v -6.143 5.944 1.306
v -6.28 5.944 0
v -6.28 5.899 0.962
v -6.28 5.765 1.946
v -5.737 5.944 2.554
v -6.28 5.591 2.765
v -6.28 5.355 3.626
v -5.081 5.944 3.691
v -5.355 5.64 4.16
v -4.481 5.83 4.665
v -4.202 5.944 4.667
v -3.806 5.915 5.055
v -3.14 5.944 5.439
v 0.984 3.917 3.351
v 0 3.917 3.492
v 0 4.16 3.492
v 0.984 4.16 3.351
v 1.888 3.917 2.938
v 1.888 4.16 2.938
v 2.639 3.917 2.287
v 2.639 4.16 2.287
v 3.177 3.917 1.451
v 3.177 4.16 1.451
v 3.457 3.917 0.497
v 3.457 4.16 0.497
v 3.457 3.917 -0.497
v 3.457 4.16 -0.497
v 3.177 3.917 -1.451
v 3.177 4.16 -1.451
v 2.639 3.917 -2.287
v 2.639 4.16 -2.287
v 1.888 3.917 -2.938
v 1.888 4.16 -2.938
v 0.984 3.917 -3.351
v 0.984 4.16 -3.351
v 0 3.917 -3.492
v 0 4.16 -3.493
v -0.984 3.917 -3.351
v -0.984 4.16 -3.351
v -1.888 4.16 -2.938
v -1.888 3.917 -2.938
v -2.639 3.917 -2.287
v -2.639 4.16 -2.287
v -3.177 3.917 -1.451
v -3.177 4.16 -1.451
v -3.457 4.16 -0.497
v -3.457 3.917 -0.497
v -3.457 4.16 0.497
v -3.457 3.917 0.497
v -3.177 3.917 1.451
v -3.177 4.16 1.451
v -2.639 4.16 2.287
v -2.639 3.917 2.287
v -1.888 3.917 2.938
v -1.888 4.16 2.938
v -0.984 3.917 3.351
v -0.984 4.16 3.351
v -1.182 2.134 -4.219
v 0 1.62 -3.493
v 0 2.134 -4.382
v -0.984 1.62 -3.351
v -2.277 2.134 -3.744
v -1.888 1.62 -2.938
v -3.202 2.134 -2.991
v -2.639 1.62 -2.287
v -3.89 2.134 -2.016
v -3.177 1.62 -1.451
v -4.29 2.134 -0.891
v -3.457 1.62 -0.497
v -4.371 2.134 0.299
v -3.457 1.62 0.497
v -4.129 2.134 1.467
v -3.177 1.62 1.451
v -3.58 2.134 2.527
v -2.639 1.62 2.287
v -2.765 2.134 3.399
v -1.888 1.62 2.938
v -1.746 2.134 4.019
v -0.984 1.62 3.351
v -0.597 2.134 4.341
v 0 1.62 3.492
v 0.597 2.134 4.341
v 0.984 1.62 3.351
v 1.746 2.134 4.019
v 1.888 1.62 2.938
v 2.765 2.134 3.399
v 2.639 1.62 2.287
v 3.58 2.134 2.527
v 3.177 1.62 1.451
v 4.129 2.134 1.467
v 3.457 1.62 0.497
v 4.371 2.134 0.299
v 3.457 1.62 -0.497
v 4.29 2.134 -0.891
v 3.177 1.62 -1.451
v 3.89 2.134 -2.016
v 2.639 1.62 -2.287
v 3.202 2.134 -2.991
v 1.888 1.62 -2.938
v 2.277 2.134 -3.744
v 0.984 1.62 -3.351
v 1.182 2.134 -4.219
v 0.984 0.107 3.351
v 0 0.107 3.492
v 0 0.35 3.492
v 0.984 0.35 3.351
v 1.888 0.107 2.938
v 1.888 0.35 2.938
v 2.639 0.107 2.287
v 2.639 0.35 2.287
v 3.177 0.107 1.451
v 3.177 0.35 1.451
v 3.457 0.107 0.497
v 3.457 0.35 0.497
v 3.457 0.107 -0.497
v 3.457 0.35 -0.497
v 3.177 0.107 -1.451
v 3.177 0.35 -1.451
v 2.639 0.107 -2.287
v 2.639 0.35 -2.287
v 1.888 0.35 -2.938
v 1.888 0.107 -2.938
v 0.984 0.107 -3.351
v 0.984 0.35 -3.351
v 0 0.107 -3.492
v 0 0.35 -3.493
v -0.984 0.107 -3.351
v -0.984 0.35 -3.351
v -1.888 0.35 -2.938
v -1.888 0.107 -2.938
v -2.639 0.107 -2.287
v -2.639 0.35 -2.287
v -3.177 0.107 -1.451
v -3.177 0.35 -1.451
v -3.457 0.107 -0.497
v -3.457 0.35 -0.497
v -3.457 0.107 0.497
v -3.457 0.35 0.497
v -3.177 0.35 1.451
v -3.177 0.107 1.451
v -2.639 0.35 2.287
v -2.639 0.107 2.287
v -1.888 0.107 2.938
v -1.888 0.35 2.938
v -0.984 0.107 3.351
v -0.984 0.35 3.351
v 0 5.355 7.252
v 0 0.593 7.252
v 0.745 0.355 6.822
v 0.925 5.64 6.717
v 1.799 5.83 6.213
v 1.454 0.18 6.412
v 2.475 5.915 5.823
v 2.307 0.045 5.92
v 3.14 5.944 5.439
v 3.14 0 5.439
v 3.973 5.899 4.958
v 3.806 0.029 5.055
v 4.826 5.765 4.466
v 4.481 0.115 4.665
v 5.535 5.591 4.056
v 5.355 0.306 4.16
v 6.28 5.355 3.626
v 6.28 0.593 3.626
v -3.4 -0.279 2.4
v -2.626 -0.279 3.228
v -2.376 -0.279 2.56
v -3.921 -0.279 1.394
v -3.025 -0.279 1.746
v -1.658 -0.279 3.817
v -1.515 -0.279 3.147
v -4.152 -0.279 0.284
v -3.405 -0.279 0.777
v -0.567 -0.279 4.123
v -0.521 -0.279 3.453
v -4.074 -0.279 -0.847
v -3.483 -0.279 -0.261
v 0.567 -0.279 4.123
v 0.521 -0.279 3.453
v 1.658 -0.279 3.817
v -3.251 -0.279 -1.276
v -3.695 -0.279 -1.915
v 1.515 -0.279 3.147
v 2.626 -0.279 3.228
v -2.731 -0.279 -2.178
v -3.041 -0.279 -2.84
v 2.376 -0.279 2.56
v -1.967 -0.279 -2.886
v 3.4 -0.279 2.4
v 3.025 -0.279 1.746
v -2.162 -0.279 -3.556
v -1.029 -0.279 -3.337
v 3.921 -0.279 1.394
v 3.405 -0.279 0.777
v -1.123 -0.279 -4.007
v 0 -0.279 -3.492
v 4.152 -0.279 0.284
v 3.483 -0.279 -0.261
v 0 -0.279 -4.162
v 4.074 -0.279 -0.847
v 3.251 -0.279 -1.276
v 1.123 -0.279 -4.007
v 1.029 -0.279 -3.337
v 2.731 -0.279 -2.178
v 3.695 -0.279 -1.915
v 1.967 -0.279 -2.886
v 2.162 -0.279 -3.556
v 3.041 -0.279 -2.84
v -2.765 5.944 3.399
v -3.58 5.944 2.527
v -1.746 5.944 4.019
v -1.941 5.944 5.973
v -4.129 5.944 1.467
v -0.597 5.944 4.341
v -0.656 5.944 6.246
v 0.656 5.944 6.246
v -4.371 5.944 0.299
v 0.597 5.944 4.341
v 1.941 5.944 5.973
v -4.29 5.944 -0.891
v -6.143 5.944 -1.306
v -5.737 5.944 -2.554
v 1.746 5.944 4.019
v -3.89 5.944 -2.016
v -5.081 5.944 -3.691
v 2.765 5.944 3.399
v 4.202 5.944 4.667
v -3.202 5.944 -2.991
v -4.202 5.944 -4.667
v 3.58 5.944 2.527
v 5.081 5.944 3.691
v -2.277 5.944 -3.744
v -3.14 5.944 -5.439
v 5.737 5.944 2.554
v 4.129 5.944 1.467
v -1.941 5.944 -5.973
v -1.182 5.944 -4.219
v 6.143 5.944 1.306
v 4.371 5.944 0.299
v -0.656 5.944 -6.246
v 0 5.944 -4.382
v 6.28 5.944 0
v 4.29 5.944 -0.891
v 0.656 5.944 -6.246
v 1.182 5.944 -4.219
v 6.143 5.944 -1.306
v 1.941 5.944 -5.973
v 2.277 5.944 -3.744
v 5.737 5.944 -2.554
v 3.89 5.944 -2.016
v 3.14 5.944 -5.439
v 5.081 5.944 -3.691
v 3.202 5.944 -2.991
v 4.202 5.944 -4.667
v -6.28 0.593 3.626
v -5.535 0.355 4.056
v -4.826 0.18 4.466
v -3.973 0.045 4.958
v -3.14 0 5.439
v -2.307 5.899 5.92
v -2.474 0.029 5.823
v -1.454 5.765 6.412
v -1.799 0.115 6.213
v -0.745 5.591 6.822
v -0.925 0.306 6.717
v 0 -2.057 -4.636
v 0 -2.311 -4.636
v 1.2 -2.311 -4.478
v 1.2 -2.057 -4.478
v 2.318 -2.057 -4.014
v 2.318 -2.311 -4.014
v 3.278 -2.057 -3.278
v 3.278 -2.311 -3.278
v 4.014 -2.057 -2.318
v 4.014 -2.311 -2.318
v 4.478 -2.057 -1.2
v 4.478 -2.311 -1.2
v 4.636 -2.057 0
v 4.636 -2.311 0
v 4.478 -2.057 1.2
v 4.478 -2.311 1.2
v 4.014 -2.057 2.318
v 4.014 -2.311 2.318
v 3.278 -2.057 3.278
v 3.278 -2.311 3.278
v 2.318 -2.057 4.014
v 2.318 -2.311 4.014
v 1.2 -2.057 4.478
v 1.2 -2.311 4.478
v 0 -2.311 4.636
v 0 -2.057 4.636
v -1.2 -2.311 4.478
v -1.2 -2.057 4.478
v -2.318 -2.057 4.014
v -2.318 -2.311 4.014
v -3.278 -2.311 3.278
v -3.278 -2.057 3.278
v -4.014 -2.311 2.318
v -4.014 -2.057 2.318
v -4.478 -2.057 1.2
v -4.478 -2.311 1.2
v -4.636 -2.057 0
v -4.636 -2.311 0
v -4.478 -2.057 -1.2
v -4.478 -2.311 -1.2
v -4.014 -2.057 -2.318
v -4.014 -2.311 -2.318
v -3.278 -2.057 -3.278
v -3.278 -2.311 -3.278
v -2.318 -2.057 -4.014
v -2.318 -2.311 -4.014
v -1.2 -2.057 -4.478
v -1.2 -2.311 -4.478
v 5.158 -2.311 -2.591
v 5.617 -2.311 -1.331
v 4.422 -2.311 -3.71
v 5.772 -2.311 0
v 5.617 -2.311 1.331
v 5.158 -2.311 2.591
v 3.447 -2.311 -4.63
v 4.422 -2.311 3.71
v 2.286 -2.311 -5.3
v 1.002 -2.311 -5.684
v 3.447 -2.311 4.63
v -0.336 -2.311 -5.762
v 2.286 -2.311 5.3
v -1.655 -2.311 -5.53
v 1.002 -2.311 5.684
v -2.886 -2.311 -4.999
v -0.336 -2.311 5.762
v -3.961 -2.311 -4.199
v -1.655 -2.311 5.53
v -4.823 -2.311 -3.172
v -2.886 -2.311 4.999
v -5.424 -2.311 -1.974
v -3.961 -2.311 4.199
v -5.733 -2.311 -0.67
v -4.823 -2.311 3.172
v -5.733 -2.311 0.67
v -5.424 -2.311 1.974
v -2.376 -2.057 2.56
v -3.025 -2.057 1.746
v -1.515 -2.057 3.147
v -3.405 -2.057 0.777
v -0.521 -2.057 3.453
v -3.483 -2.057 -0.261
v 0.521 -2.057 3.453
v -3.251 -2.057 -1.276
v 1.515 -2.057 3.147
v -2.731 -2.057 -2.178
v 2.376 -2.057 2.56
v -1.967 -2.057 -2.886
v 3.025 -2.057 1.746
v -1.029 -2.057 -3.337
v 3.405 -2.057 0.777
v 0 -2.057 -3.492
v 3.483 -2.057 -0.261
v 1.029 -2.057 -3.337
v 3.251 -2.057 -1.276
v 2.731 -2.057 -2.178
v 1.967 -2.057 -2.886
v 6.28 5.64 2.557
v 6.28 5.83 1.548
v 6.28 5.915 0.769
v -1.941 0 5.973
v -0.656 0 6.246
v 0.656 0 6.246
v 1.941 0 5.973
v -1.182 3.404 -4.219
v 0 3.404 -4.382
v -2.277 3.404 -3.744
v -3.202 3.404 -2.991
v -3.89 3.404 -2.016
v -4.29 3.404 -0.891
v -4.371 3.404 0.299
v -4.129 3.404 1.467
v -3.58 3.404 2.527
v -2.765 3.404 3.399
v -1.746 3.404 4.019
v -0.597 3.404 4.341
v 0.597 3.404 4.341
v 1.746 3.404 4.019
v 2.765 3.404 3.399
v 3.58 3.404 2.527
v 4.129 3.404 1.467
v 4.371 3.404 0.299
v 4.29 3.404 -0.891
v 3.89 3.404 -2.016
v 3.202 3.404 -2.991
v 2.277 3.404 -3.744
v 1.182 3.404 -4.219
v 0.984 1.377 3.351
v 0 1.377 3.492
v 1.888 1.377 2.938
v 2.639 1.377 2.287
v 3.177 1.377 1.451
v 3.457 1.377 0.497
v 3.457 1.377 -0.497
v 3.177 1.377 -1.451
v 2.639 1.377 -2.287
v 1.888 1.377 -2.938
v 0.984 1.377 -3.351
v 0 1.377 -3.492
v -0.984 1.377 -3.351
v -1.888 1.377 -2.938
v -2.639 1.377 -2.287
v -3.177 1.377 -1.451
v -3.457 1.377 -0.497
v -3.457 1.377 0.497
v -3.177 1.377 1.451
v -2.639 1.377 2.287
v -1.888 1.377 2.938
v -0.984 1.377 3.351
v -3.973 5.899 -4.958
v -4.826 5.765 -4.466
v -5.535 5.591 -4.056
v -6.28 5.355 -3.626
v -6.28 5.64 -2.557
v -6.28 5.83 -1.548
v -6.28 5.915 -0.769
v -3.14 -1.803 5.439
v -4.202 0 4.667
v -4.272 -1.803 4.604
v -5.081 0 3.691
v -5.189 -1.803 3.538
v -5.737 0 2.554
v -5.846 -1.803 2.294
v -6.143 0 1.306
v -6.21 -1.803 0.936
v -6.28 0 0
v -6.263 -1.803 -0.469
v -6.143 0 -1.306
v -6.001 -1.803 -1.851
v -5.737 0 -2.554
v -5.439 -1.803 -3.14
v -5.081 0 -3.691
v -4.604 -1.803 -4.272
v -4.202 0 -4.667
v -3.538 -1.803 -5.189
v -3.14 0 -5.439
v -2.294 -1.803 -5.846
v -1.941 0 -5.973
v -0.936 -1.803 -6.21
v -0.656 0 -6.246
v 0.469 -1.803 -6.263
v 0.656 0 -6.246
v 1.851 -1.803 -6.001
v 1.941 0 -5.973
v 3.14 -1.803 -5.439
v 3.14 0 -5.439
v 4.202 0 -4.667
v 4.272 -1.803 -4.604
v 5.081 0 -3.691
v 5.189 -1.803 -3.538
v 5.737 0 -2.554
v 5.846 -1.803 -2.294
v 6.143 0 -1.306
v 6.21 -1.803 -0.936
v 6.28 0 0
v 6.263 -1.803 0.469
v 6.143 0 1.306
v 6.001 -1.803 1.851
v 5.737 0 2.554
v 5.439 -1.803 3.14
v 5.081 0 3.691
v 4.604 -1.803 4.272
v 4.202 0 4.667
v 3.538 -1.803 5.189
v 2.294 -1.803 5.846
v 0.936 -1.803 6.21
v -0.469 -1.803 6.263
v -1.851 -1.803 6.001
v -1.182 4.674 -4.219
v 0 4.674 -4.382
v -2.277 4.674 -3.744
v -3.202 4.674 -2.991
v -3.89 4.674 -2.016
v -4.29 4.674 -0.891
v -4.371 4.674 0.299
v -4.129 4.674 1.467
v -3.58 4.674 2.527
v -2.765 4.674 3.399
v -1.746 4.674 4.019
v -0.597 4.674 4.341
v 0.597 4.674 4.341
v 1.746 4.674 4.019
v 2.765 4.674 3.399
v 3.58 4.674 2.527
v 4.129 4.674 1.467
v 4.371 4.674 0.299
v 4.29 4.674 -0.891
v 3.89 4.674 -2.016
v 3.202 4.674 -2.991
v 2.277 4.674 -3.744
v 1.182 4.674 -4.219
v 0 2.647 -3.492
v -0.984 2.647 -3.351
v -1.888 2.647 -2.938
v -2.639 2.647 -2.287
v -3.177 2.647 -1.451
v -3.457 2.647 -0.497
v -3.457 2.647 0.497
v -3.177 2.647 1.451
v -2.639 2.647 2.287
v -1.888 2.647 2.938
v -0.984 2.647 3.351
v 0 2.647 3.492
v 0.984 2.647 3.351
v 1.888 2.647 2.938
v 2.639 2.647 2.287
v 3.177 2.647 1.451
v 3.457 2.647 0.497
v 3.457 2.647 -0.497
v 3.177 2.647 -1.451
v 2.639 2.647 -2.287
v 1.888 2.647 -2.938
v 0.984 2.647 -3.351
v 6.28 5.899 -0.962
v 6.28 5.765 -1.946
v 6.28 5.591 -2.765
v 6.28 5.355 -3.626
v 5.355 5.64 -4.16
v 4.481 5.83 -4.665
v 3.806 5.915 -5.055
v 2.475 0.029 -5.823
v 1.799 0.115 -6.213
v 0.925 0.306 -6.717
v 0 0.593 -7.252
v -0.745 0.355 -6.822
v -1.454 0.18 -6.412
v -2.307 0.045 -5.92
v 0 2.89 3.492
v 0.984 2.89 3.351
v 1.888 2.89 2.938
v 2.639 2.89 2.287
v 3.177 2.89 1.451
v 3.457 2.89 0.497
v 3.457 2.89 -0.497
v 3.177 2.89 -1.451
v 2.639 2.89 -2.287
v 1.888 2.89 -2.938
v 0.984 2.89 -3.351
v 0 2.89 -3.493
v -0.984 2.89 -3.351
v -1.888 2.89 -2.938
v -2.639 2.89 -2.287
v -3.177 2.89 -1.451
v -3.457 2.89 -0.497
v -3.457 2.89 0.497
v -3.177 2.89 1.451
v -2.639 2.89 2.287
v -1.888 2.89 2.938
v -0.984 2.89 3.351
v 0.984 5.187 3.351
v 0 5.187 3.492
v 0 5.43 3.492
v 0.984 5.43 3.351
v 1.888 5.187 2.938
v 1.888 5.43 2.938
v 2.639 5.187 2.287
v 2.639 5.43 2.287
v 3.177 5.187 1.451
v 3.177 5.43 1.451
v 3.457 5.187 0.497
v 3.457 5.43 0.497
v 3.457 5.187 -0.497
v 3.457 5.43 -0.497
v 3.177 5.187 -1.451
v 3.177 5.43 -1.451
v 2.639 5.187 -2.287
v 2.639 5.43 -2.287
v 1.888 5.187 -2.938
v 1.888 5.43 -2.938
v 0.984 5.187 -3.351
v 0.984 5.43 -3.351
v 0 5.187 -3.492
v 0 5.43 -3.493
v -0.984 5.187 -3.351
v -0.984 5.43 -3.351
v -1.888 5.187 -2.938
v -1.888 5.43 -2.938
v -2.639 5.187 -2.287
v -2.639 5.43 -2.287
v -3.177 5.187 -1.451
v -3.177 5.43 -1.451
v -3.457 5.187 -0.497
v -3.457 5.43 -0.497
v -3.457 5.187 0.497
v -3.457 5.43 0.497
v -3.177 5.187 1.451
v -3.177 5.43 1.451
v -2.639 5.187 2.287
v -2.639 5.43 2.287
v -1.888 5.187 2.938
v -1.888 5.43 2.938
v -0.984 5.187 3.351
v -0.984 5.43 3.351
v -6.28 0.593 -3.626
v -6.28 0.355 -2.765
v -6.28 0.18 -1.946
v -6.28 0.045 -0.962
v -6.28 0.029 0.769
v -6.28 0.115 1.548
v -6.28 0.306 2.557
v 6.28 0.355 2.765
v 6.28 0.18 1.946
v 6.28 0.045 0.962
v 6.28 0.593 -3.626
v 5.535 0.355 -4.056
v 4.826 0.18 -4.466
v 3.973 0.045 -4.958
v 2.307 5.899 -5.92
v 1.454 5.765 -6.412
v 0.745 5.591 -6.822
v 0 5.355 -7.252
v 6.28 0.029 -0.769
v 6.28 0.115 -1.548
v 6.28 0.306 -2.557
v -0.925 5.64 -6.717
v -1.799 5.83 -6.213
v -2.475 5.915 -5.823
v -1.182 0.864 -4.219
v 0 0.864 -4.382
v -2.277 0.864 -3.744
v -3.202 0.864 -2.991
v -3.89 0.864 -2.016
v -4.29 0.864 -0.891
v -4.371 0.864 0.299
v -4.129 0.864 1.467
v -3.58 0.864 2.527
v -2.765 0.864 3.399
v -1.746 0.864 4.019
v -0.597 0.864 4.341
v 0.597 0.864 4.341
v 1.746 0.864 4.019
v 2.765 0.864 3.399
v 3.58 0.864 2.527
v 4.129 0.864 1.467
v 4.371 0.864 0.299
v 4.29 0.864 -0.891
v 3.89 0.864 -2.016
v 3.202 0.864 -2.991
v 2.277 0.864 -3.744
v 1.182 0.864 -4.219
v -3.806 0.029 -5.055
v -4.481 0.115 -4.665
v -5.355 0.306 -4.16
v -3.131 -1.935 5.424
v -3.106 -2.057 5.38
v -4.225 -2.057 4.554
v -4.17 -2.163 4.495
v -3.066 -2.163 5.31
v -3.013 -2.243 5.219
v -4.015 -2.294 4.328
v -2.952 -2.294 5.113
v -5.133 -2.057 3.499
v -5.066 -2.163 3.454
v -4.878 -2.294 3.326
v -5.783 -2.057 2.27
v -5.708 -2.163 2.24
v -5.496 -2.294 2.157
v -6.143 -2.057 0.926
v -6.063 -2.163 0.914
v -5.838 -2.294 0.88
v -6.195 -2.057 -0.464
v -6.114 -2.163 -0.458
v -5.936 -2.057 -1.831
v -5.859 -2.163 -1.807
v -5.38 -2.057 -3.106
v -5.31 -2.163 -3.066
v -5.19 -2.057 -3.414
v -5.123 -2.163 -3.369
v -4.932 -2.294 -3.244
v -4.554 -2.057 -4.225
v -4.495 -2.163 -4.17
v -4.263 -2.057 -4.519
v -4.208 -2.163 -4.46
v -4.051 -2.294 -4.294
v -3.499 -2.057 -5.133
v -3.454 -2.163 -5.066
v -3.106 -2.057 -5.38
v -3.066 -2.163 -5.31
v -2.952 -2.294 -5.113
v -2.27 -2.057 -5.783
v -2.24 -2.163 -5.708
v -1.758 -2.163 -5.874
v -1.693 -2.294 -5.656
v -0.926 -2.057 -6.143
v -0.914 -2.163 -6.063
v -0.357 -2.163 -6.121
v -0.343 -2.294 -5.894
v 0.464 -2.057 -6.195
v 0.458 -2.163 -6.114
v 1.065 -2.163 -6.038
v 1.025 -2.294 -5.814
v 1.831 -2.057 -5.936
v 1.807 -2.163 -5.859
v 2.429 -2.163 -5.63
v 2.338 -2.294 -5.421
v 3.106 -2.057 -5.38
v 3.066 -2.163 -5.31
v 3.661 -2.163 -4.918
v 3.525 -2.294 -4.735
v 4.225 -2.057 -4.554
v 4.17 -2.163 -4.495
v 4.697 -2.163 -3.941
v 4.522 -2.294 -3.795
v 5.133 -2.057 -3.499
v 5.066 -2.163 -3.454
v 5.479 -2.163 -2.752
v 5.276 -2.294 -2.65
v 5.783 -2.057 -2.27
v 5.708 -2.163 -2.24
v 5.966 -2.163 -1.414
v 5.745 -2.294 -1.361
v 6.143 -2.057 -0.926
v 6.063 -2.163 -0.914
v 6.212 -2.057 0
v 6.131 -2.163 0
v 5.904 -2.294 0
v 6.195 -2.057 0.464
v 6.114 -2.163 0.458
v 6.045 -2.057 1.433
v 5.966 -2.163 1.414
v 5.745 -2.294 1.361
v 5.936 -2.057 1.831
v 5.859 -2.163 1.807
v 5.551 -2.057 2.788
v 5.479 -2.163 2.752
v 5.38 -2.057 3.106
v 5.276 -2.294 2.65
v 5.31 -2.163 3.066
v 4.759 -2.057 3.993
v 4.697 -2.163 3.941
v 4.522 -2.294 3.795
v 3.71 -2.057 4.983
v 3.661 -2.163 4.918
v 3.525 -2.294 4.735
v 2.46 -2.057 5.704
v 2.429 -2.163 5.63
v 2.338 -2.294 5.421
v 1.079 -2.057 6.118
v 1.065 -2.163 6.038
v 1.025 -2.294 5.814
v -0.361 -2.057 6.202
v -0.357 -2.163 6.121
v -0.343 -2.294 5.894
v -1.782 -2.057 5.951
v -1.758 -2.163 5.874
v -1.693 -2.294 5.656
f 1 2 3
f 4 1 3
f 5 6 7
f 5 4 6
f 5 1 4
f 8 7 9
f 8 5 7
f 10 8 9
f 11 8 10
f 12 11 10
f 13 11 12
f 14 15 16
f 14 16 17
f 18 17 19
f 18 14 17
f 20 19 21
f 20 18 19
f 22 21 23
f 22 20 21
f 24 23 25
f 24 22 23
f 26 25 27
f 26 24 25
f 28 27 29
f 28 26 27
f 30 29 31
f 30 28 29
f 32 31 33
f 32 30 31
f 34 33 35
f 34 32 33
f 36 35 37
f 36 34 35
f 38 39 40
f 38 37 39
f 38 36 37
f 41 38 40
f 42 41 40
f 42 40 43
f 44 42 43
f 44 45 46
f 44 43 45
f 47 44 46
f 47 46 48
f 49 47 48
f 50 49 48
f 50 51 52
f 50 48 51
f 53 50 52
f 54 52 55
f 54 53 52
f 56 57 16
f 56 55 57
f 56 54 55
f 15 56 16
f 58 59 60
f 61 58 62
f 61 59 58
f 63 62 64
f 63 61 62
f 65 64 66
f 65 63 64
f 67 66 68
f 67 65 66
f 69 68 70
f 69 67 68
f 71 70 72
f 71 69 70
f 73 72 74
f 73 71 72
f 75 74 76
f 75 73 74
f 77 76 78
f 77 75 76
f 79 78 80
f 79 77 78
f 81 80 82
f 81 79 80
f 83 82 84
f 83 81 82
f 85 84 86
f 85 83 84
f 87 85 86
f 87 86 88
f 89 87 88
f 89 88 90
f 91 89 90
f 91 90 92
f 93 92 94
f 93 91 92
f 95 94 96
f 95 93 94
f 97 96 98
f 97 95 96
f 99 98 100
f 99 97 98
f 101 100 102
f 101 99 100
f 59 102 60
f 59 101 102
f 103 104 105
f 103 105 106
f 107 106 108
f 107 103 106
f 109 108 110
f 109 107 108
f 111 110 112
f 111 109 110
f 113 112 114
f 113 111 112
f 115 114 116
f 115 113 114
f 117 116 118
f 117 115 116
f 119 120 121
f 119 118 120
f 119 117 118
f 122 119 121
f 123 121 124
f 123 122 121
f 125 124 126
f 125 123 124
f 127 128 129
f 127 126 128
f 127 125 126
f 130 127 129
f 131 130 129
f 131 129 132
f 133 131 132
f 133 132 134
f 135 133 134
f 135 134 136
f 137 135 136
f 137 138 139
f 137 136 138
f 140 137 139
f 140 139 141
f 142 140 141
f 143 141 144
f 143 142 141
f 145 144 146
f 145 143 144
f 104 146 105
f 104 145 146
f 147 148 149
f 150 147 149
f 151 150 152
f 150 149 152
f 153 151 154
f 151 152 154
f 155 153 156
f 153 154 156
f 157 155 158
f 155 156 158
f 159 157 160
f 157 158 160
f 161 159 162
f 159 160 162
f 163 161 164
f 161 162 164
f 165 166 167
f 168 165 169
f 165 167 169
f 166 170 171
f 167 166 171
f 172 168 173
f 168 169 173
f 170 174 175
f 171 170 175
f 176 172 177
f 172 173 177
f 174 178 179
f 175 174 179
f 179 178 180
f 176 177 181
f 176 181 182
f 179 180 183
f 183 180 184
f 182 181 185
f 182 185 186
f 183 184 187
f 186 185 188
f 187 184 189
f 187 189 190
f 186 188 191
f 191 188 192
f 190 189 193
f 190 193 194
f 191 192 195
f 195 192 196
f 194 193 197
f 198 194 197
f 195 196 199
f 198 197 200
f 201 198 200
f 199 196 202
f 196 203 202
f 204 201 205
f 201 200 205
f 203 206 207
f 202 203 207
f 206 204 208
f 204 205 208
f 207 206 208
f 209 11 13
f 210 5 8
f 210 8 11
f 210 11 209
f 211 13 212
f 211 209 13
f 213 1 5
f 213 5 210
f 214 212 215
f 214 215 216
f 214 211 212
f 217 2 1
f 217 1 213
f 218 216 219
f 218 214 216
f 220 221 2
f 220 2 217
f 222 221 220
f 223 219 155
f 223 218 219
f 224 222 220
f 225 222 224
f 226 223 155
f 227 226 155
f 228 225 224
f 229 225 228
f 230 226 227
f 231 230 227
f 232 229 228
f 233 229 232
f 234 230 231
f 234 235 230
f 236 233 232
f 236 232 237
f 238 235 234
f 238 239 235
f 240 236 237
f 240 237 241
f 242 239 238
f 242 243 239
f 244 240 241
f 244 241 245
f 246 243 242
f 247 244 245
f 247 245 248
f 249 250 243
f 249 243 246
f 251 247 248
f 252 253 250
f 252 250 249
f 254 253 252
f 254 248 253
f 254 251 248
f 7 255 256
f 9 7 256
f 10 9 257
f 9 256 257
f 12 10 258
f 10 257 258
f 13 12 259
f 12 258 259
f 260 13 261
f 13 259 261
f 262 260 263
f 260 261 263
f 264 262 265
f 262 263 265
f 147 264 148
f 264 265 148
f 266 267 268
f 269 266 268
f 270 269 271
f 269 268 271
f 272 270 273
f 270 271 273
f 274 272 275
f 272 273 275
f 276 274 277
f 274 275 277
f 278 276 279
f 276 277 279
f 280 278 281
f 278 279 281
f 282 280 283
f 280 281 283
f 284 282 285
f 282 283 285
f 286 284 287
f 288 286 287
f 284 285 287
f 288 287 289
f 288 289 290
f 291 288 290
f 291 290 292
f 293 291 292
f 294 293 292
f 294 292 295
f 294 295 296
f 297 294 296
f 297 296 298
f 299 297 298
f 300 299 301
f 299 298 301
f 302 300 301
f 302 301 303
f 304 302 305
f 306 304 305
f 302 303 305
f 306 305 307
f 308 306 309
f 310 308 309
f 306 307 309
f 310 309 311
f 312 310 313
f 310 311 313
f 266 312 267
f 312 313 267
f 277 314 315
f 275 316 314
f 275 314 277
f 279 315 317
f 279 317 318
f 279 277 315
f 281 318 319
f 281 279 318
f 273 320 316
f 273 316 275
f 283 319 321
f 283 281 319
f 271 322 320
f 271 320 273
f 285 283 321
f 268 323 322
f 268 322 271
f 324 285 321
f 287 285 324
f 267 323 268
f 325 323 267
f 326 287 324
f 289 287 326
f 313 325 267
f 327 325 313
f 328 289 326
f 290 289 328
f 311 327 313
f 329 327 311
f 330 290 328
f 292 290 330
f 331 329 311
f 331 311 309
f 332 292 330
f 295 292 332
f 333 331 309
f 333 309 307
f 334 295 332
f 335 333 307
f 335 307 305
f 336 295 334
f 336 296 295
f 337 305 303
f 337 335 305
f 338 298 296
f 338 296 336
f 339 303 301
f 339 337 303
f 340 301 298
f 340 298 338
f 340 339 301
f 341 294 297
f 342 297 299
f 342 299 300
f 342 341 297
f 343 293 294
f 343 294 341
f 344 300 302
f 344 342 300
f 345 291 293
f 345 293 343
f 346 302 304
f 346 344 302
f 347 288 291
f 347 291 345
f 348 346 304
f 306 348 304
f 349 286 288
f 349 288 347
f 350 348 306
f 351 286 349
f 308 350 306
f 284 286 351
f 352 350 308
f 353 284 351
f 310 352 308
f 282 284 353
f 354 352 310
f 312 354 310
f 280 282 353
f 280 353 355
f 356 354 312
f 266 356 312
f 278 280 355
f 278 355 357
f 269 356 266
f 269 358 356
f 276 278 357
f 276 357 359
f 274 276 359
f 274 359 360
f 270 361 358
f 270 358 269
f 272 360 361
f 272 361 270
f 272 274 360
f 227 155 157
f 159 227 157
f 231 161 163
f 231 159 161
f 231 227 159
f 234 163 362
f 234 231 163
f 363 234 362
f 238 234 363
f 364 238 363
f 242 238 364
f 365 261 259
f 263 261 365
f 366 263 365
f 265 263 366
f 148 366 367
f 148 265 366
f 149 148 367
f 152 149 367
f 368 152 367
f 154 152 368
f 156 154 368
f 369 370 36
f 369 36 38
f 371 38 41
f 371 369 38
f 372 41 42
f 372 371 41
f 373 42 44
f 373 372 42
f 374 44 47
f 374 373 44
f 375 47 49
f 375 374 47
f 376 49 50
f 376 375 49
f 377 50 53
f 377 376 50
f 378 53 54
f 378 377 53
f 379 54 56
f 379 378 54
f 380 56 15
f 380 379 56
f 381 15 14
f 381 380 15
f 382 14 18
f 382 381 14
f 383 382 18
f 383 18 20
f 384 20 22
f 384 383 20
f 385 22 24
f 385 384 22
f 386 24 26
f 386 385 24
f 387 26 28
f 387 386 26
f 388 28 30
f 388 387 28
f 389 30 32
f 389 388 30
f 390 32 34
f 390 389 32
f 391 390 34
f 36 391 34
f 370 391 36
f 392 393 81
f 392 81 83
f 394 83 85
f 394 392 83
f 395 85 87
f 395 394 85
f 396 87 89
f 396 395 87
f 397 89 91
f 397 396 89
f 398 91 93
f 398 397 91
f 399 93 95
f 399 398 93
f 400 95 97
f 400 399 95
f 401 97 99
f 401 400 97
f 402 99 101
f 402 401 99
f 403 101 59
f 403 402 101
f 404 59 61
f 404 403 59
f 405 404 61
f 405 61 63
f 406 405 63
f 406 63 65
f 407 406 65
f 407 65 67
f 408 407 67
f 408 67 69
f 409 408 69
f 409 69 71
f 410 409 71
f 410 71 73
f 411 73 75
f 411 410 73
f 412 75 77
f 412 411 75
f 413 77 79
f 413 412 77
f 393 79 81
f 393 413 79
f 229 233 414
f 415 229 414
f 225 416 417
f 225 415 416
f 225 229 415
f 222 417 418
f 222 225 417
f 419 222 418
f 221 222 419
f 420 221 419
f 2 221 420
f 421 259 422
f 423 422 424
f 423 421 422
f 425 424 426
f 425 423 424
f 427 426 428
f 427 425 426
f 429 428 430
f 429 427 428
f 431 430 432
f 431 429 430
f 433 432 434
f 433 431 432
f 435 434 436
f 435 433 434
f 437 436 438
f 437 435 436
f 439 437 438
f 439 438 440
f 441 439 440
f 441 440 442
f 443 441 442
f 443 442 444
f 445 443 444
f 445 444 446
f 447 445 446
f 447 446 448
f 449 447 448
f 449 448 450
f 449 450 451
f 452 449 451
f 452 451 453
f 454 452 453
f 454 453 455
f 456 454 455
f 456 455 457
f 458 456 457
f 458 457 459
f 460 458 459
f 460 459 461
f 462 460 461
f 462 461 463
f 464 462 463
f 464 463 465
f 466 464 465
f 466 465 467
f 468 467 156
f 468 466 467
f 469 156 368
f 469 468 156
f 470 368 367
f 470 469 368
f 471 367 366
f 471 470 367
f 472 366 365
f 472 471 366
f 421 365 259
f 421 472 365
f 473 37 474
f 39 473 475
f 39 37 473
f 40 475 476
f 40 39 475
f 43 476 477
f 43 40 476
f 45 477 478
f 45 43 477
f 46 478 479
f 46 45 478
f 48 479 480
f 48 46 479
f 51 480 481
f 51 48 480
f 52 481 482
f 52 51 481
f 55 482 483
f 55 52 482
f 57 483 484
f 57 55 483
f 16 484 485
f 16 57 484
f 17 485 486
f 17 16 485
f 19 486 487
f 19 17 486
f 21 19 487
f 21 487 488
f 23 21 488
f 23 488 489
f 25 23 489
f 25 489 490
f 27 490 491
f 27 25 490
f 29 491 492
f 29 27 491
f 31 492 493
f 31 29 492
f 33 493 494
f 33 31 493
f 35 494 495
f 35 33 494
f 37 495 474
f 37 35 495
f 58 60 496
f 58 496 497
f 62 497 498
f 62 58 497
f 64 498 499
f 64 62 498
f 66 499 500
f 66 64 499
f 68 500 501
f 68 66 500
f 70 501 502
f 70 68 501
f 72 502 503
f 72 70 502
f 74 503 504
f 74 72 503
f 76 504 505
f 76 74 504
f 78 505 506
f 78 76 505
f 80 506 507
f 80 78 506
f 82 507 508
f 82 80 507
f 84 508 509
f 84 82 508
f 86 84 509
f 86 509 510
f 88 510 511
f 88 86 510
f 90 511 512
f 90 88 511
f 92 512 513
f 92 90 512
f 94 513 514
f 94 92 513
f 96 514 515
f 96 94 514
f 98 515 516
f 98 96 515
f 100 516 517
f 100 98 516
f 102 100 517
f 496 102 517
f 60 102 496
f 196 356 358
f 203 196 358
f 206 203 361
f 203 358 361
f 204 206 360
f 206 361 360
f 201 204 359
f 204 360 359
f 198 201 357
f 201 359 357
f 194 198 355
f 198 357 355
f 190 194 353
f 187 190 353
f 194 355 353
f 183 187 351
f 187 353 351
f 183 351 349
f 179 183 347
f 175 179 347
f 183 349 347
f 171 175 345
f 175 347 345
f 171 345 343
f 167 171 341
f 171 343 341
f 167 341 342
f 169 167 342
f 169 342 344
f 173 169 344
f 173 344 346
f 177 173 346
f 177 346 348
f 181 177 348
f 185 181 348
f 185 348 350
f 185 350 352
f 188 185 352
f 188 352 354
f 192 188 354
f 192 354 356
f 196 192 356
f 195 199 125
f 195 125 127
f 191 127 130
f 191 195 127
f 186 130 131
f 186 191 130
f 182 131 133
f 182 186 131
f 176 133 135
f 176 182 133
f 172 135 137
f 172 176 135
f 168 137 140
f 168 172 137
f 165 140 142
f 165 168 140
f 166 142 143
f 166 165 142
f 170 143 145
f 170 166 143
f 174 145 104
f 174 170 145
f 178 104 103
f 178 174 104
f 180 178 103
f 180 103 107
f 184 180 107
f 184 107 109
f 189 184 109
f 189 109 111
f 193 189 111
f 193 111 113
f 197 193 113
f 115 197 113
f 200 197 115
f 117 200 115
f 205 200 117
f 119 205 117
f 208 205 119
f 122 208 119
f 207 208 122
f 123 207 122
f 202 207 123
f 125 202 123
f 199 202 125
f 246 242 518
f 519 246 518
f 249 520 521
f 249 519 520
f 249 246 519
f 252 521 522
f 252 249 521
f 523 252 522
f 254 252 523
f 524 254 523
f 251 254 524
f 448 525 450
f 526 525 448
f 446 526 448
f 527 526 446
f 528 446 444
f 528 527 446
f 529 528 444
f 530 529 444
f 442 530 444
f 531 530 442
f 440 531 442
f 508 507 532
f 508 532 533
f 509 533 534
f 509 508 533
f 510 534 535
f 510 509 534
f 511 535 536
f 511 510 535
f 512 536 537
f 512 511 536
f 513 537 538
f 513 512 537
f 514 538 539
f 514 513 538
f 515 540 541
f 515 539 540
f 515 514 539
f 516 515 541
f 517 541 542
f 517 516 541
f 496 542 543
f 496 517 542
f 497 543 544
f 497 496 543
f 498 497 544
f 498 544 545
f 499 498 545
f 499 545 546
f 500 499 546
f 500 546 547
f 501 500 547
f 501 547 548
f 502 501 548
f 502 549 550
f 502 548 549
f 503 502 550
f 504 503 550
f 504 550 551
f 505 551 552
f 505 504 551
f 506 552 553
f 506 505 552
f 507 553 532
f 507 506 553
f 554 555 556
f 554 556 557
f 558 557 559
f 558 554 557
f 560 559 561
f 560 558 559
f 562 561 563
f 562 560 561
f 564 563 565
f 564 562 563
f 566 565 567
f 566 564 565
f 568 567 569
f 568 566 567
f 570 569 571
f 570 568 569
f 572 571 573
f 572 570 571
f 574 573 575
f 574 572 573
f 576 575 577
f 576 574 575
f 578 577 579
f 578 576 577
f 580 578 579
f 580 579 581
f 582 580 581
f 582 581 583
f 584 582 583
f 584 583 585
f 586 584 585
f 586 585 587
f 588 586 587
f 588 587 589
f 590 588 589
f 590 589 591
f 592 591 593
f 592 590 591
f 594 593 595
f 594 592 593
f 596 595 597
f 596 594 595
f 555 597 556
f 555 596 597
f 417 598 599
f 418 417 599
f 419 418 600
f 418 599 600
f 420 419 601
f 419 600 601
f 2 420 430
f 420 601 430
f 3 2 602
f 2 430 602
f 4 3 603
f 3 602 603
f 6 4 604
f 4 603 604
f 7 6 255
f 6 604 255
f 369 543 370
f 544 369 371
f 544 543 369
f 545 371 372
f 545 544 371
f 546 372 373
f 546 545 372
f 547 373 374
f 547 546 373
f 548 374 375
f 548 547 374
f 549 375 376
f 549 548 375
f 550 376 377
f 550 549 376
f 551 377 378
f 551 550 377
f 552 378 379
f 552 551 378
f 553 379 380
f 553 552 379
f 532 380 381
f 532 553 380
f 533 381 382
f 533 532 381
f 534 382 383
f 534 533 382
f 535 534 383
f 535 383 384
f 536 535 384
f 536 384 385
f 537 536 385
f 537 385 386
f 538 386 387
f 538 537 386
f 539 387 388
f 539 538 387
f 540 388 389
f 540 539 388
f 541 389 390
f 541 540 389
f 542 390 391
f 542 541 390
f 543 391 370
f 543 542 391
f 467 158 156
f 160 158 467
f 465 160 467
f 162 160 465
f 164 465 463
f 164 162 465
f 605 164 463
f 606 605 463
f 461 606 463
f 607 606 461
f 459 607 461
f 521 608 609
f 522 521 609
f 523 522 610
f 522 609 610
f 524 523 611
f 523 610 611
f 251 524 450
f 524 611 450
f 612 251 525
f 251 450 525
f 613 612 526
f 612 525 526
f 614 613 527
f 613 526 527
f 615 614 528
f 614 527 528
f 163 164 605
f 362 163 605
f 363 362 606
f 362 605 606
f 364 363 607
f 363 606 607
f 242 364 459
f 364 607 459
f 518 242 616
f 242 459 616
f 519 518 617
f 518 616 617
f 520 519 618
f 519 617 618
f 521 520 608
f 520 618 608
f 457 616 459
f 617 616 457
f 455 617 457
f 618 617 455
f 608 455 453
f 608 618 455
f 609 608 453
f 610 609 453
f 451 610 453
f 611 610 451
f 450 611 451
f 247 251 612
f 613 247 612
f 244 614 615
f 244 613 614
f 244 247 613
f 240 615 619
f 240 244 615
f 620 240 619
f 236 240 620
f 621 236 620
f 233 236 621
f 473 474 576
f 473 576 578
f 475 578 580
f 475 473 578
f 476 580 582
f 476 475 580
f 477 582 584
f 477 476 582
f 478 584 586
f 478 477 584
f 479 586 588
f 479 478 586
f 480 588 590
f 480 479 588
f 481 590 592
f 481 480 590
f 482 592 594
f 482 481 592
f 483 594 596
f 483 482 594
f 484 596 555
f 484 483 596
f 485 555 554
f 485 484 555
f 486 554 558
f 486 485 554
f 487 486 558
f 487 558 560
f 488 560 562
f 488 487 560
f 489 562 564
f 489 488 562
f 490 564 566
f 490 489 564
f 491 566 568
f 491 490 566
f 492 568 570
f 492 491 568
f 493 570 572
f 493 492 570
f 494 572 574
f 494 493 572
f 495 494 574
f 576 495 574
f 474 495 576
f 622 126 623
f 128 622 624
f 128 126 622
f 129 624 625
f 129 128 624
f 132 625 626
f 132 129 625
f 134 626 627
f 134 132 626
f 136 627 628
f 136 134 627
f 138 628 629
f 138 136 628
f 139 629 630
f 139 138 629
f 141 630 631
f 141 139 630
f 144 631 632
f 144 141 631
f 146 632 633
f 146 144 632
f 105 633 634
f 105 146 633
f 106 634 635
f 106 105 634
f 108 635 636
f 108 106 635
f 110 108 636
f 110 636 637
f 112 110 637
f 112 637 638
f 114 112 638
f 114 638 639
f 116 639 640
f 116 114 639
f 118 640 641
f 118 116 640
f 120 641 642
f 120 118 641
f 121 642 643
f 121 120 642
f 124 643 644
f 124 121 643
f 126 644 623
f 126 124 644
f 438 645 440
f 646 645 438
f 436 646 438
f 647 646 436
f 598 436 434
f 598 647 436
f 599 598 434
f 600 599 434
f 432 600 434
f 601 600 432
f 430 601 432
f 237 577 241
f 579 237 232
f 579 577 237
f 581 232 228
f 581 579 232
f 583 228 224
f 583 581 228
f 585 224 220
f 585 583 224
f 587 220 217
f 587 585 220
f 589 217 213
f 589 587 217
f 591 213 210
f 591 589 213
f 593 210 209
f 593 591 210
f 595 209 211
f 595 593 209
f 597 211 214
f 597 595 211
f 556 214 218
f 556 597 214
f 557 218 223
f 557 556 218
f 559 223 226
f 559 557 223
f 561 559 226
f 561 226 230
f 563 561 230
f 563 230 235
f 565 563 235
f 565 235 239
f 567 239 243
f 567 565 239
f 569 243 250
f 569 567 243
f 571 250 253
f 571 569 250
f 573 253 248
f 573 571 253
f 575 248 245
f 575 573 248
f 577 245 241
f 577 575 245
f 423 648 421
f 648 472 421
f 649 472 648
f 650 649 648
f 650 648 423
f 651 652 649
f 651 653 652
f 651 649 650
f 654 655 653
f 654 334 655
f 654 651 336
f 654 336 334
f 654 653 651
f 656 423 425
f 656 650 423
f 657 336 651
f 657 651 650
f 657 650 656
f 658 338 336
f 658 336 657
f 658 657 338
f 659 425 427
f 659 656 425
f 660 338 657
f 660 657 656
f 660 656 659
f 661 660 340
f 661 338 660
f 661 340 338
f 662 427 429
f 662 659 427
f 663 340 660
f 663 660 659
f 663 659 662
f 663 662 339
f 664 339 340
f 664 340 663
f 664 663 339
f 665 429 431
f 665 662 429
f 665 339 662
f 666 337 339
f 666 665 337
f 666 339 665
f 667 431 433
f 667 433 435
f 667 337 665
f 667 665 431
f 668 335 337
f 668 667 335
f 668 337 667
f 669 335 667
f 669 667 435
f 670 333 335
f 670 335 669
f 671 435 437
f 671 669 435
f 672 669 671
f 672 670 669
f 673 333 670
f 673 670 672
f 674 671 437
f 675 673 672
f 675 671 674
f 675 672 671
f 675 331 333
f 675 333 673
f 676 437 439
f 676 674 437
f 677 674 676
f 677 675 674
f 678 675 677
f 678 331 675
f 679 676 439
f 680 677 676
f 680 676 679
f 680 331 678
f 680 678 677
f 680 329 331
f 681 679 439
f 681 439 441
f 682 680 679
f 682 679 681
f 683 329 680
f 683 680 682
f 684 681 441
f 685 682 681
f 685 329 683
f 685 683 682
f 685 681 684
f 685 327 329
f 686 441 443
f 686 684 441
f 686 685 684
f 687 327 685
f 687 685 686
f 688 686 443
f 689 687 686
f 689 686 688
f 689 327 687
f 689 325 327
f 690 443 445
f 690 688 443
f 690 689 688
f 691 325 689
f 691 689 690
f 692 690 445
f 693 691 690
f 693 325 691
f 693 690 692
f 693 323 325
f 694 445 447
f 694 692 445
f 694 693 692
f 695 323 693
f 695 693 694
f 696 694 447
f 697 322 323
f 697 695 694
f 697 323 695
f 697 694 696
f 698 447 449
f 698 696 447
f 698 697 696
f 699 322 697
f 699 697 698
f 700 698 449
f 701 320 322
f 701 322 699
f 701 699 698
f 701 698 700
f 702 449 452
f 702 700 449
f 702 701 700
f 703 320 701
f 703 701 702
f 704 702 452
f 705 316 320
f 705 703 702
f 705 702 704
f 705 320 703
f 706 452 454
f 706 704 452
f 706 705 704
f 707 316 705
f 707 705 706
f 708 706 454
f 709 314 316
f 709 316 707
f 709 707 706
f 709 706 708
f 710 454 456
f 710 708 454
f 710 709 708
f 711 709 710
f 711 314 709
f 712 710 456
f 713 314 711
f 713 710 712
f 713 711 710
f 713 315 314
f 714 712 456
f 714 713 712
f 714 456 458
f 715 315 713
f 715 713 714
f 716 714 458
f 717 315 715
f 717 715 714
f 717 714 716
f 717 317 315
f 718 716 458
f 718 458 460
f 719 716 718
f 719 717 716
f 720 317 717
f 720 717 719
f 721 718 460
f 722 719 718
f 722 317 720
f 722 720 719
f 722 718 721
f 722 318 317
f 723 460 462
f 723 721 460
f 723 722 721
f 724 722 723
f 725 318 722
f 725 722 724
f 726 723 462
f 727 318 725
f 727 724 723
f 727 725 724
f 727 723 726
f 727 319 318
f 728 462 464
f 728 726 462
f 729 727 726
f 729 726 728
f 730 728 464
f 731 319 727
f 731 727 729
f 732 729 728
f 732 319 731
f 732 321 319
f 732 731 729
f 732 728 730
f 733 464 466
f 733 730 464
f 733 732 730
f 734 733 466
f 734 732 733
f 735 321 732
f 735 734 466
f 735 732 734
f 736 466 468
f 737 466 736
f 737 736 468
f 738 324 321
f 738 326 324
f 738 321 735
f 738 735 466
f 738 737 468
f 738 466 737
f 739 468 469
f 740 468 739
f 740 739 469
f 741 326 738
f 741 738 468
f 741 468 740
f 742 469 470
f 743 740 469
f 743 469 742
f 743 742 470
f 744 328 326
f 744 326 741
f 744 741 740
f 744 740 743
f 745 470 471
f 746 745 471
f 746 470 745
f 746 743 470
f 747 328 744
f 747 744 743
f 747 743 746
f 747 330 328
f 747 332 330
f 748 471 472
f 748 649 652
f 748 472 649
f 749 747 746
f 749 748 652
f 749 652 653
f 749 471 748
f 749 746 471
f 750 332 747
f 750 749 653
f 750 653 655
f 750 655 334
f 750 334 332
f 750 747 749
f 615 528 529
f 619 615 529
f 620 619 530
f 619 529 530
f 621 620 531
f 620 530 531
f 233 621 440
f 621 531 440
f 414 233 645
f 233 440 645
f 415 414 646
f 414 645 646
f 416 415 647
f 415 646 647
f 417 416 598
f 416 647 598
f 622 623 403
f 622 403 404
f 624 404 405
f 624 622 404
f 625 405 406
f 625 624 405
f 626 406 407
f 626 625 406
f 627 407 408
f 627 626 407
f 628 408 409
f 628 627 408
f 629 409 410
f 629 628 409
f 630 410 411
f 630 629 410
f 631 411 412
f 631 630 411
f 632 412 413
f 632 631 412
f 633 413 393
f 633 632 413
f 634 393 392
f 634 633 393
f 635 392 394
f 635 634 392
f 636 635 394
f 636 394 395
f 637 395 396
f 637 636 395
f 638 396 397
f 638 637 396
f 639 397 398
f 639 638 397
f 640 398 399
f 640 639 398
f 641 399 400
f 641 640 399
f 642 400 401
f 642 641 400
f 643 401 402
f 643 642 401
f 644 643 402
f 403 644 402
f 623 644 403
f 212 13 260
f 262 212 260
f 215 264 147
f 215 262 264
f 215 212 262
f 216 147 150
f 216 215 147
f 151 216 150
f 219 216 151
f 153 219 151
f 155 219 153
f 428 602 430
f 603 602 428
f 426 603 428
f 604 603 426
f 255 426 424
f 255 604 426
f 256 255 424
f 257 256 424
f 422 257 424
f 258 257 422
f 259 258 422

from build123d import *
from build123d.topology import SkipClean

# Parameters (mm, degrees)
SKETCH1_R           = 3.4925
BOSS_EXTRUDE1_DEPTH = 5.9436
BOSS_EXTRUDE2_START = 2.3114
SKETCH2_R           = 6.280156421
SKETCH2_R_2         = 3.4925
BOSS_EXTRUDE2_DEPTH = 2.3114
FILLET2_R           = 0.508
SKETCH4_R           = 4.6355
SKETCH4_R_2         = 3.4925
CUT_EXTRUDE1_DEPTH  = 0.254
SKETCH6_R           = 4.6355
SKETCH6_R_2         = 3.4925
BOSS_EXTRUDE3_DEPTH = 1.778


with BuildPart() as part:
    # Sketch1 → Boss-Extrude1 (new body)
    with BuildSketch(Plane(origin=(0, 0, 0), x_dir=(1, 0, 0), z_dir=(0, 1, 0))):
        Polygon((0, -7.2517), (6.280156421, -3.62585), (6.280156421, 3.62585), (0, 7.2517), (-6.280156421, 3.62585), (-6.280156421, -3.62585), align=None)
        with Locations(Location((0, 0, 0), (0, 0, 270))):
            Circle(SKETCH1_R, mode=Mode.SUBTRACT)
    extrude(amount=BOSS_EXTRUDE1_DEPTH)

    # Sketch2 → Boss-Extrude2 (add)
    with SkipClean():  # the faces are left unmerged after this step: merging them gives an invalid solid
        with BuildSketch(Plane.XZ.offset(BOSS_EXTRUDE2_START)):
            with Locations(Location((0, 0, 0), (0, 0, 120))):
                Circle(SKETCH2_R)
            with Locations(Location((0, 0, 0), (0, 0, 270))):
                Circle(SKETCH2_R_2, mode=Mode.SUBTRACT)
        extrude(amount=-BOSS_EXTRUDE2_DEPTH)

    # Fillet2
    fillet2_edges = [part.edges().sort_by_distance(p)[0] for p in [
        (3.14007821, -2.3114, -5.438775),
    ]]
    fillet(fillet2_edges, radius=FILLET2_R)

    # Sketch3 → Cut-Revolve1 (revolve, cut)
    with BuildSketch(Plane(origin=(0, 0, 0), x_dir=(0, 0, -1), z_dir=(1, 0, 0)), mode=Mode.PRIVATE) as cut_revolve1_sk:
        Polygon((-7.2517, 0.593112632), (-7.2517, 0), (-6.280156421, 0), align=None)
        Polygon((-6.280156421, 5.9436), (-7.2517, 5.9436), (-7.2517, 5.355420001), align=None)
        Polygon((-3.391632963, 6.5151), (-4.3815, 5.9436), (-3.294472118, 5.31600416), align=None)
        Polygon((-3.391632963, 5.2451), (-4.3815, 4.6736), (-3.294472118, 4.04600416), align=None)
        Polygon((-3.391632963, 3.9751), (-4.3815, 3.4036), (-3.294472118, 2.77600416), align=None)
        Polygon((-3.391632963, 2.7051), (-4.3815, 2.1336), (-3.294472118, 1.50600416), align=None)
        Polygon((-3.391632963, 1.4351), (-4.3815, 0.8636), (-3.294472118, 0.23600416), align=None)
        Polygon((-3.391632963, 0.1651), (-4.3815, -0.4064), (-3.294472118, -1.03399584), align=None)
        Polygon((-3.391632963, -1.1049), (-4.3815, -1.6764), (-3.294472118, -2.30399584), align=None)
    revolve(cut_revolve1_sk.sketch.rotate(Axis((0, 0, 0), (0, 1, 0)), 180), axis=Axis((0, 0, 0), (0, 1, 0)), mode=Mode.SUBTRACT)

    # Sketch4 → Cut-Extrude1 (cut)
    with BuildSketch(Plane.XZ.offset(2.3114)):
        with Locations(Location((0, 0, 0), (0, 0, 270))):
            Circle(SKETCH4_R)
        with Locations(Location((0, 0, 0), (0, 0, 270))):
            Circle(SKETCH4_R_2, mode=Mode.SUBTRACT)
    extrude(amount=-CUT_EXTRUDE1_DEPTH, mode=Mode.SUBTRACT)

    # Sketch6 → Boss-Extrude3 (add)
    with BuildSketch(Plane.XZ.offset(2.0574)):
        with Locations(Location((0, 0, 0), (0, 0, 270))):
            Circle(SKETCH6_R)
        with Locations(Location((0, 0, 0), (0, 0, 270))):
            Circle(SKETCH6_R_2, mode=Mode.SUBTRACT)
    extrude(amount=-BOSS_EXTRUDE3_DEPTH)


solid = part.part
